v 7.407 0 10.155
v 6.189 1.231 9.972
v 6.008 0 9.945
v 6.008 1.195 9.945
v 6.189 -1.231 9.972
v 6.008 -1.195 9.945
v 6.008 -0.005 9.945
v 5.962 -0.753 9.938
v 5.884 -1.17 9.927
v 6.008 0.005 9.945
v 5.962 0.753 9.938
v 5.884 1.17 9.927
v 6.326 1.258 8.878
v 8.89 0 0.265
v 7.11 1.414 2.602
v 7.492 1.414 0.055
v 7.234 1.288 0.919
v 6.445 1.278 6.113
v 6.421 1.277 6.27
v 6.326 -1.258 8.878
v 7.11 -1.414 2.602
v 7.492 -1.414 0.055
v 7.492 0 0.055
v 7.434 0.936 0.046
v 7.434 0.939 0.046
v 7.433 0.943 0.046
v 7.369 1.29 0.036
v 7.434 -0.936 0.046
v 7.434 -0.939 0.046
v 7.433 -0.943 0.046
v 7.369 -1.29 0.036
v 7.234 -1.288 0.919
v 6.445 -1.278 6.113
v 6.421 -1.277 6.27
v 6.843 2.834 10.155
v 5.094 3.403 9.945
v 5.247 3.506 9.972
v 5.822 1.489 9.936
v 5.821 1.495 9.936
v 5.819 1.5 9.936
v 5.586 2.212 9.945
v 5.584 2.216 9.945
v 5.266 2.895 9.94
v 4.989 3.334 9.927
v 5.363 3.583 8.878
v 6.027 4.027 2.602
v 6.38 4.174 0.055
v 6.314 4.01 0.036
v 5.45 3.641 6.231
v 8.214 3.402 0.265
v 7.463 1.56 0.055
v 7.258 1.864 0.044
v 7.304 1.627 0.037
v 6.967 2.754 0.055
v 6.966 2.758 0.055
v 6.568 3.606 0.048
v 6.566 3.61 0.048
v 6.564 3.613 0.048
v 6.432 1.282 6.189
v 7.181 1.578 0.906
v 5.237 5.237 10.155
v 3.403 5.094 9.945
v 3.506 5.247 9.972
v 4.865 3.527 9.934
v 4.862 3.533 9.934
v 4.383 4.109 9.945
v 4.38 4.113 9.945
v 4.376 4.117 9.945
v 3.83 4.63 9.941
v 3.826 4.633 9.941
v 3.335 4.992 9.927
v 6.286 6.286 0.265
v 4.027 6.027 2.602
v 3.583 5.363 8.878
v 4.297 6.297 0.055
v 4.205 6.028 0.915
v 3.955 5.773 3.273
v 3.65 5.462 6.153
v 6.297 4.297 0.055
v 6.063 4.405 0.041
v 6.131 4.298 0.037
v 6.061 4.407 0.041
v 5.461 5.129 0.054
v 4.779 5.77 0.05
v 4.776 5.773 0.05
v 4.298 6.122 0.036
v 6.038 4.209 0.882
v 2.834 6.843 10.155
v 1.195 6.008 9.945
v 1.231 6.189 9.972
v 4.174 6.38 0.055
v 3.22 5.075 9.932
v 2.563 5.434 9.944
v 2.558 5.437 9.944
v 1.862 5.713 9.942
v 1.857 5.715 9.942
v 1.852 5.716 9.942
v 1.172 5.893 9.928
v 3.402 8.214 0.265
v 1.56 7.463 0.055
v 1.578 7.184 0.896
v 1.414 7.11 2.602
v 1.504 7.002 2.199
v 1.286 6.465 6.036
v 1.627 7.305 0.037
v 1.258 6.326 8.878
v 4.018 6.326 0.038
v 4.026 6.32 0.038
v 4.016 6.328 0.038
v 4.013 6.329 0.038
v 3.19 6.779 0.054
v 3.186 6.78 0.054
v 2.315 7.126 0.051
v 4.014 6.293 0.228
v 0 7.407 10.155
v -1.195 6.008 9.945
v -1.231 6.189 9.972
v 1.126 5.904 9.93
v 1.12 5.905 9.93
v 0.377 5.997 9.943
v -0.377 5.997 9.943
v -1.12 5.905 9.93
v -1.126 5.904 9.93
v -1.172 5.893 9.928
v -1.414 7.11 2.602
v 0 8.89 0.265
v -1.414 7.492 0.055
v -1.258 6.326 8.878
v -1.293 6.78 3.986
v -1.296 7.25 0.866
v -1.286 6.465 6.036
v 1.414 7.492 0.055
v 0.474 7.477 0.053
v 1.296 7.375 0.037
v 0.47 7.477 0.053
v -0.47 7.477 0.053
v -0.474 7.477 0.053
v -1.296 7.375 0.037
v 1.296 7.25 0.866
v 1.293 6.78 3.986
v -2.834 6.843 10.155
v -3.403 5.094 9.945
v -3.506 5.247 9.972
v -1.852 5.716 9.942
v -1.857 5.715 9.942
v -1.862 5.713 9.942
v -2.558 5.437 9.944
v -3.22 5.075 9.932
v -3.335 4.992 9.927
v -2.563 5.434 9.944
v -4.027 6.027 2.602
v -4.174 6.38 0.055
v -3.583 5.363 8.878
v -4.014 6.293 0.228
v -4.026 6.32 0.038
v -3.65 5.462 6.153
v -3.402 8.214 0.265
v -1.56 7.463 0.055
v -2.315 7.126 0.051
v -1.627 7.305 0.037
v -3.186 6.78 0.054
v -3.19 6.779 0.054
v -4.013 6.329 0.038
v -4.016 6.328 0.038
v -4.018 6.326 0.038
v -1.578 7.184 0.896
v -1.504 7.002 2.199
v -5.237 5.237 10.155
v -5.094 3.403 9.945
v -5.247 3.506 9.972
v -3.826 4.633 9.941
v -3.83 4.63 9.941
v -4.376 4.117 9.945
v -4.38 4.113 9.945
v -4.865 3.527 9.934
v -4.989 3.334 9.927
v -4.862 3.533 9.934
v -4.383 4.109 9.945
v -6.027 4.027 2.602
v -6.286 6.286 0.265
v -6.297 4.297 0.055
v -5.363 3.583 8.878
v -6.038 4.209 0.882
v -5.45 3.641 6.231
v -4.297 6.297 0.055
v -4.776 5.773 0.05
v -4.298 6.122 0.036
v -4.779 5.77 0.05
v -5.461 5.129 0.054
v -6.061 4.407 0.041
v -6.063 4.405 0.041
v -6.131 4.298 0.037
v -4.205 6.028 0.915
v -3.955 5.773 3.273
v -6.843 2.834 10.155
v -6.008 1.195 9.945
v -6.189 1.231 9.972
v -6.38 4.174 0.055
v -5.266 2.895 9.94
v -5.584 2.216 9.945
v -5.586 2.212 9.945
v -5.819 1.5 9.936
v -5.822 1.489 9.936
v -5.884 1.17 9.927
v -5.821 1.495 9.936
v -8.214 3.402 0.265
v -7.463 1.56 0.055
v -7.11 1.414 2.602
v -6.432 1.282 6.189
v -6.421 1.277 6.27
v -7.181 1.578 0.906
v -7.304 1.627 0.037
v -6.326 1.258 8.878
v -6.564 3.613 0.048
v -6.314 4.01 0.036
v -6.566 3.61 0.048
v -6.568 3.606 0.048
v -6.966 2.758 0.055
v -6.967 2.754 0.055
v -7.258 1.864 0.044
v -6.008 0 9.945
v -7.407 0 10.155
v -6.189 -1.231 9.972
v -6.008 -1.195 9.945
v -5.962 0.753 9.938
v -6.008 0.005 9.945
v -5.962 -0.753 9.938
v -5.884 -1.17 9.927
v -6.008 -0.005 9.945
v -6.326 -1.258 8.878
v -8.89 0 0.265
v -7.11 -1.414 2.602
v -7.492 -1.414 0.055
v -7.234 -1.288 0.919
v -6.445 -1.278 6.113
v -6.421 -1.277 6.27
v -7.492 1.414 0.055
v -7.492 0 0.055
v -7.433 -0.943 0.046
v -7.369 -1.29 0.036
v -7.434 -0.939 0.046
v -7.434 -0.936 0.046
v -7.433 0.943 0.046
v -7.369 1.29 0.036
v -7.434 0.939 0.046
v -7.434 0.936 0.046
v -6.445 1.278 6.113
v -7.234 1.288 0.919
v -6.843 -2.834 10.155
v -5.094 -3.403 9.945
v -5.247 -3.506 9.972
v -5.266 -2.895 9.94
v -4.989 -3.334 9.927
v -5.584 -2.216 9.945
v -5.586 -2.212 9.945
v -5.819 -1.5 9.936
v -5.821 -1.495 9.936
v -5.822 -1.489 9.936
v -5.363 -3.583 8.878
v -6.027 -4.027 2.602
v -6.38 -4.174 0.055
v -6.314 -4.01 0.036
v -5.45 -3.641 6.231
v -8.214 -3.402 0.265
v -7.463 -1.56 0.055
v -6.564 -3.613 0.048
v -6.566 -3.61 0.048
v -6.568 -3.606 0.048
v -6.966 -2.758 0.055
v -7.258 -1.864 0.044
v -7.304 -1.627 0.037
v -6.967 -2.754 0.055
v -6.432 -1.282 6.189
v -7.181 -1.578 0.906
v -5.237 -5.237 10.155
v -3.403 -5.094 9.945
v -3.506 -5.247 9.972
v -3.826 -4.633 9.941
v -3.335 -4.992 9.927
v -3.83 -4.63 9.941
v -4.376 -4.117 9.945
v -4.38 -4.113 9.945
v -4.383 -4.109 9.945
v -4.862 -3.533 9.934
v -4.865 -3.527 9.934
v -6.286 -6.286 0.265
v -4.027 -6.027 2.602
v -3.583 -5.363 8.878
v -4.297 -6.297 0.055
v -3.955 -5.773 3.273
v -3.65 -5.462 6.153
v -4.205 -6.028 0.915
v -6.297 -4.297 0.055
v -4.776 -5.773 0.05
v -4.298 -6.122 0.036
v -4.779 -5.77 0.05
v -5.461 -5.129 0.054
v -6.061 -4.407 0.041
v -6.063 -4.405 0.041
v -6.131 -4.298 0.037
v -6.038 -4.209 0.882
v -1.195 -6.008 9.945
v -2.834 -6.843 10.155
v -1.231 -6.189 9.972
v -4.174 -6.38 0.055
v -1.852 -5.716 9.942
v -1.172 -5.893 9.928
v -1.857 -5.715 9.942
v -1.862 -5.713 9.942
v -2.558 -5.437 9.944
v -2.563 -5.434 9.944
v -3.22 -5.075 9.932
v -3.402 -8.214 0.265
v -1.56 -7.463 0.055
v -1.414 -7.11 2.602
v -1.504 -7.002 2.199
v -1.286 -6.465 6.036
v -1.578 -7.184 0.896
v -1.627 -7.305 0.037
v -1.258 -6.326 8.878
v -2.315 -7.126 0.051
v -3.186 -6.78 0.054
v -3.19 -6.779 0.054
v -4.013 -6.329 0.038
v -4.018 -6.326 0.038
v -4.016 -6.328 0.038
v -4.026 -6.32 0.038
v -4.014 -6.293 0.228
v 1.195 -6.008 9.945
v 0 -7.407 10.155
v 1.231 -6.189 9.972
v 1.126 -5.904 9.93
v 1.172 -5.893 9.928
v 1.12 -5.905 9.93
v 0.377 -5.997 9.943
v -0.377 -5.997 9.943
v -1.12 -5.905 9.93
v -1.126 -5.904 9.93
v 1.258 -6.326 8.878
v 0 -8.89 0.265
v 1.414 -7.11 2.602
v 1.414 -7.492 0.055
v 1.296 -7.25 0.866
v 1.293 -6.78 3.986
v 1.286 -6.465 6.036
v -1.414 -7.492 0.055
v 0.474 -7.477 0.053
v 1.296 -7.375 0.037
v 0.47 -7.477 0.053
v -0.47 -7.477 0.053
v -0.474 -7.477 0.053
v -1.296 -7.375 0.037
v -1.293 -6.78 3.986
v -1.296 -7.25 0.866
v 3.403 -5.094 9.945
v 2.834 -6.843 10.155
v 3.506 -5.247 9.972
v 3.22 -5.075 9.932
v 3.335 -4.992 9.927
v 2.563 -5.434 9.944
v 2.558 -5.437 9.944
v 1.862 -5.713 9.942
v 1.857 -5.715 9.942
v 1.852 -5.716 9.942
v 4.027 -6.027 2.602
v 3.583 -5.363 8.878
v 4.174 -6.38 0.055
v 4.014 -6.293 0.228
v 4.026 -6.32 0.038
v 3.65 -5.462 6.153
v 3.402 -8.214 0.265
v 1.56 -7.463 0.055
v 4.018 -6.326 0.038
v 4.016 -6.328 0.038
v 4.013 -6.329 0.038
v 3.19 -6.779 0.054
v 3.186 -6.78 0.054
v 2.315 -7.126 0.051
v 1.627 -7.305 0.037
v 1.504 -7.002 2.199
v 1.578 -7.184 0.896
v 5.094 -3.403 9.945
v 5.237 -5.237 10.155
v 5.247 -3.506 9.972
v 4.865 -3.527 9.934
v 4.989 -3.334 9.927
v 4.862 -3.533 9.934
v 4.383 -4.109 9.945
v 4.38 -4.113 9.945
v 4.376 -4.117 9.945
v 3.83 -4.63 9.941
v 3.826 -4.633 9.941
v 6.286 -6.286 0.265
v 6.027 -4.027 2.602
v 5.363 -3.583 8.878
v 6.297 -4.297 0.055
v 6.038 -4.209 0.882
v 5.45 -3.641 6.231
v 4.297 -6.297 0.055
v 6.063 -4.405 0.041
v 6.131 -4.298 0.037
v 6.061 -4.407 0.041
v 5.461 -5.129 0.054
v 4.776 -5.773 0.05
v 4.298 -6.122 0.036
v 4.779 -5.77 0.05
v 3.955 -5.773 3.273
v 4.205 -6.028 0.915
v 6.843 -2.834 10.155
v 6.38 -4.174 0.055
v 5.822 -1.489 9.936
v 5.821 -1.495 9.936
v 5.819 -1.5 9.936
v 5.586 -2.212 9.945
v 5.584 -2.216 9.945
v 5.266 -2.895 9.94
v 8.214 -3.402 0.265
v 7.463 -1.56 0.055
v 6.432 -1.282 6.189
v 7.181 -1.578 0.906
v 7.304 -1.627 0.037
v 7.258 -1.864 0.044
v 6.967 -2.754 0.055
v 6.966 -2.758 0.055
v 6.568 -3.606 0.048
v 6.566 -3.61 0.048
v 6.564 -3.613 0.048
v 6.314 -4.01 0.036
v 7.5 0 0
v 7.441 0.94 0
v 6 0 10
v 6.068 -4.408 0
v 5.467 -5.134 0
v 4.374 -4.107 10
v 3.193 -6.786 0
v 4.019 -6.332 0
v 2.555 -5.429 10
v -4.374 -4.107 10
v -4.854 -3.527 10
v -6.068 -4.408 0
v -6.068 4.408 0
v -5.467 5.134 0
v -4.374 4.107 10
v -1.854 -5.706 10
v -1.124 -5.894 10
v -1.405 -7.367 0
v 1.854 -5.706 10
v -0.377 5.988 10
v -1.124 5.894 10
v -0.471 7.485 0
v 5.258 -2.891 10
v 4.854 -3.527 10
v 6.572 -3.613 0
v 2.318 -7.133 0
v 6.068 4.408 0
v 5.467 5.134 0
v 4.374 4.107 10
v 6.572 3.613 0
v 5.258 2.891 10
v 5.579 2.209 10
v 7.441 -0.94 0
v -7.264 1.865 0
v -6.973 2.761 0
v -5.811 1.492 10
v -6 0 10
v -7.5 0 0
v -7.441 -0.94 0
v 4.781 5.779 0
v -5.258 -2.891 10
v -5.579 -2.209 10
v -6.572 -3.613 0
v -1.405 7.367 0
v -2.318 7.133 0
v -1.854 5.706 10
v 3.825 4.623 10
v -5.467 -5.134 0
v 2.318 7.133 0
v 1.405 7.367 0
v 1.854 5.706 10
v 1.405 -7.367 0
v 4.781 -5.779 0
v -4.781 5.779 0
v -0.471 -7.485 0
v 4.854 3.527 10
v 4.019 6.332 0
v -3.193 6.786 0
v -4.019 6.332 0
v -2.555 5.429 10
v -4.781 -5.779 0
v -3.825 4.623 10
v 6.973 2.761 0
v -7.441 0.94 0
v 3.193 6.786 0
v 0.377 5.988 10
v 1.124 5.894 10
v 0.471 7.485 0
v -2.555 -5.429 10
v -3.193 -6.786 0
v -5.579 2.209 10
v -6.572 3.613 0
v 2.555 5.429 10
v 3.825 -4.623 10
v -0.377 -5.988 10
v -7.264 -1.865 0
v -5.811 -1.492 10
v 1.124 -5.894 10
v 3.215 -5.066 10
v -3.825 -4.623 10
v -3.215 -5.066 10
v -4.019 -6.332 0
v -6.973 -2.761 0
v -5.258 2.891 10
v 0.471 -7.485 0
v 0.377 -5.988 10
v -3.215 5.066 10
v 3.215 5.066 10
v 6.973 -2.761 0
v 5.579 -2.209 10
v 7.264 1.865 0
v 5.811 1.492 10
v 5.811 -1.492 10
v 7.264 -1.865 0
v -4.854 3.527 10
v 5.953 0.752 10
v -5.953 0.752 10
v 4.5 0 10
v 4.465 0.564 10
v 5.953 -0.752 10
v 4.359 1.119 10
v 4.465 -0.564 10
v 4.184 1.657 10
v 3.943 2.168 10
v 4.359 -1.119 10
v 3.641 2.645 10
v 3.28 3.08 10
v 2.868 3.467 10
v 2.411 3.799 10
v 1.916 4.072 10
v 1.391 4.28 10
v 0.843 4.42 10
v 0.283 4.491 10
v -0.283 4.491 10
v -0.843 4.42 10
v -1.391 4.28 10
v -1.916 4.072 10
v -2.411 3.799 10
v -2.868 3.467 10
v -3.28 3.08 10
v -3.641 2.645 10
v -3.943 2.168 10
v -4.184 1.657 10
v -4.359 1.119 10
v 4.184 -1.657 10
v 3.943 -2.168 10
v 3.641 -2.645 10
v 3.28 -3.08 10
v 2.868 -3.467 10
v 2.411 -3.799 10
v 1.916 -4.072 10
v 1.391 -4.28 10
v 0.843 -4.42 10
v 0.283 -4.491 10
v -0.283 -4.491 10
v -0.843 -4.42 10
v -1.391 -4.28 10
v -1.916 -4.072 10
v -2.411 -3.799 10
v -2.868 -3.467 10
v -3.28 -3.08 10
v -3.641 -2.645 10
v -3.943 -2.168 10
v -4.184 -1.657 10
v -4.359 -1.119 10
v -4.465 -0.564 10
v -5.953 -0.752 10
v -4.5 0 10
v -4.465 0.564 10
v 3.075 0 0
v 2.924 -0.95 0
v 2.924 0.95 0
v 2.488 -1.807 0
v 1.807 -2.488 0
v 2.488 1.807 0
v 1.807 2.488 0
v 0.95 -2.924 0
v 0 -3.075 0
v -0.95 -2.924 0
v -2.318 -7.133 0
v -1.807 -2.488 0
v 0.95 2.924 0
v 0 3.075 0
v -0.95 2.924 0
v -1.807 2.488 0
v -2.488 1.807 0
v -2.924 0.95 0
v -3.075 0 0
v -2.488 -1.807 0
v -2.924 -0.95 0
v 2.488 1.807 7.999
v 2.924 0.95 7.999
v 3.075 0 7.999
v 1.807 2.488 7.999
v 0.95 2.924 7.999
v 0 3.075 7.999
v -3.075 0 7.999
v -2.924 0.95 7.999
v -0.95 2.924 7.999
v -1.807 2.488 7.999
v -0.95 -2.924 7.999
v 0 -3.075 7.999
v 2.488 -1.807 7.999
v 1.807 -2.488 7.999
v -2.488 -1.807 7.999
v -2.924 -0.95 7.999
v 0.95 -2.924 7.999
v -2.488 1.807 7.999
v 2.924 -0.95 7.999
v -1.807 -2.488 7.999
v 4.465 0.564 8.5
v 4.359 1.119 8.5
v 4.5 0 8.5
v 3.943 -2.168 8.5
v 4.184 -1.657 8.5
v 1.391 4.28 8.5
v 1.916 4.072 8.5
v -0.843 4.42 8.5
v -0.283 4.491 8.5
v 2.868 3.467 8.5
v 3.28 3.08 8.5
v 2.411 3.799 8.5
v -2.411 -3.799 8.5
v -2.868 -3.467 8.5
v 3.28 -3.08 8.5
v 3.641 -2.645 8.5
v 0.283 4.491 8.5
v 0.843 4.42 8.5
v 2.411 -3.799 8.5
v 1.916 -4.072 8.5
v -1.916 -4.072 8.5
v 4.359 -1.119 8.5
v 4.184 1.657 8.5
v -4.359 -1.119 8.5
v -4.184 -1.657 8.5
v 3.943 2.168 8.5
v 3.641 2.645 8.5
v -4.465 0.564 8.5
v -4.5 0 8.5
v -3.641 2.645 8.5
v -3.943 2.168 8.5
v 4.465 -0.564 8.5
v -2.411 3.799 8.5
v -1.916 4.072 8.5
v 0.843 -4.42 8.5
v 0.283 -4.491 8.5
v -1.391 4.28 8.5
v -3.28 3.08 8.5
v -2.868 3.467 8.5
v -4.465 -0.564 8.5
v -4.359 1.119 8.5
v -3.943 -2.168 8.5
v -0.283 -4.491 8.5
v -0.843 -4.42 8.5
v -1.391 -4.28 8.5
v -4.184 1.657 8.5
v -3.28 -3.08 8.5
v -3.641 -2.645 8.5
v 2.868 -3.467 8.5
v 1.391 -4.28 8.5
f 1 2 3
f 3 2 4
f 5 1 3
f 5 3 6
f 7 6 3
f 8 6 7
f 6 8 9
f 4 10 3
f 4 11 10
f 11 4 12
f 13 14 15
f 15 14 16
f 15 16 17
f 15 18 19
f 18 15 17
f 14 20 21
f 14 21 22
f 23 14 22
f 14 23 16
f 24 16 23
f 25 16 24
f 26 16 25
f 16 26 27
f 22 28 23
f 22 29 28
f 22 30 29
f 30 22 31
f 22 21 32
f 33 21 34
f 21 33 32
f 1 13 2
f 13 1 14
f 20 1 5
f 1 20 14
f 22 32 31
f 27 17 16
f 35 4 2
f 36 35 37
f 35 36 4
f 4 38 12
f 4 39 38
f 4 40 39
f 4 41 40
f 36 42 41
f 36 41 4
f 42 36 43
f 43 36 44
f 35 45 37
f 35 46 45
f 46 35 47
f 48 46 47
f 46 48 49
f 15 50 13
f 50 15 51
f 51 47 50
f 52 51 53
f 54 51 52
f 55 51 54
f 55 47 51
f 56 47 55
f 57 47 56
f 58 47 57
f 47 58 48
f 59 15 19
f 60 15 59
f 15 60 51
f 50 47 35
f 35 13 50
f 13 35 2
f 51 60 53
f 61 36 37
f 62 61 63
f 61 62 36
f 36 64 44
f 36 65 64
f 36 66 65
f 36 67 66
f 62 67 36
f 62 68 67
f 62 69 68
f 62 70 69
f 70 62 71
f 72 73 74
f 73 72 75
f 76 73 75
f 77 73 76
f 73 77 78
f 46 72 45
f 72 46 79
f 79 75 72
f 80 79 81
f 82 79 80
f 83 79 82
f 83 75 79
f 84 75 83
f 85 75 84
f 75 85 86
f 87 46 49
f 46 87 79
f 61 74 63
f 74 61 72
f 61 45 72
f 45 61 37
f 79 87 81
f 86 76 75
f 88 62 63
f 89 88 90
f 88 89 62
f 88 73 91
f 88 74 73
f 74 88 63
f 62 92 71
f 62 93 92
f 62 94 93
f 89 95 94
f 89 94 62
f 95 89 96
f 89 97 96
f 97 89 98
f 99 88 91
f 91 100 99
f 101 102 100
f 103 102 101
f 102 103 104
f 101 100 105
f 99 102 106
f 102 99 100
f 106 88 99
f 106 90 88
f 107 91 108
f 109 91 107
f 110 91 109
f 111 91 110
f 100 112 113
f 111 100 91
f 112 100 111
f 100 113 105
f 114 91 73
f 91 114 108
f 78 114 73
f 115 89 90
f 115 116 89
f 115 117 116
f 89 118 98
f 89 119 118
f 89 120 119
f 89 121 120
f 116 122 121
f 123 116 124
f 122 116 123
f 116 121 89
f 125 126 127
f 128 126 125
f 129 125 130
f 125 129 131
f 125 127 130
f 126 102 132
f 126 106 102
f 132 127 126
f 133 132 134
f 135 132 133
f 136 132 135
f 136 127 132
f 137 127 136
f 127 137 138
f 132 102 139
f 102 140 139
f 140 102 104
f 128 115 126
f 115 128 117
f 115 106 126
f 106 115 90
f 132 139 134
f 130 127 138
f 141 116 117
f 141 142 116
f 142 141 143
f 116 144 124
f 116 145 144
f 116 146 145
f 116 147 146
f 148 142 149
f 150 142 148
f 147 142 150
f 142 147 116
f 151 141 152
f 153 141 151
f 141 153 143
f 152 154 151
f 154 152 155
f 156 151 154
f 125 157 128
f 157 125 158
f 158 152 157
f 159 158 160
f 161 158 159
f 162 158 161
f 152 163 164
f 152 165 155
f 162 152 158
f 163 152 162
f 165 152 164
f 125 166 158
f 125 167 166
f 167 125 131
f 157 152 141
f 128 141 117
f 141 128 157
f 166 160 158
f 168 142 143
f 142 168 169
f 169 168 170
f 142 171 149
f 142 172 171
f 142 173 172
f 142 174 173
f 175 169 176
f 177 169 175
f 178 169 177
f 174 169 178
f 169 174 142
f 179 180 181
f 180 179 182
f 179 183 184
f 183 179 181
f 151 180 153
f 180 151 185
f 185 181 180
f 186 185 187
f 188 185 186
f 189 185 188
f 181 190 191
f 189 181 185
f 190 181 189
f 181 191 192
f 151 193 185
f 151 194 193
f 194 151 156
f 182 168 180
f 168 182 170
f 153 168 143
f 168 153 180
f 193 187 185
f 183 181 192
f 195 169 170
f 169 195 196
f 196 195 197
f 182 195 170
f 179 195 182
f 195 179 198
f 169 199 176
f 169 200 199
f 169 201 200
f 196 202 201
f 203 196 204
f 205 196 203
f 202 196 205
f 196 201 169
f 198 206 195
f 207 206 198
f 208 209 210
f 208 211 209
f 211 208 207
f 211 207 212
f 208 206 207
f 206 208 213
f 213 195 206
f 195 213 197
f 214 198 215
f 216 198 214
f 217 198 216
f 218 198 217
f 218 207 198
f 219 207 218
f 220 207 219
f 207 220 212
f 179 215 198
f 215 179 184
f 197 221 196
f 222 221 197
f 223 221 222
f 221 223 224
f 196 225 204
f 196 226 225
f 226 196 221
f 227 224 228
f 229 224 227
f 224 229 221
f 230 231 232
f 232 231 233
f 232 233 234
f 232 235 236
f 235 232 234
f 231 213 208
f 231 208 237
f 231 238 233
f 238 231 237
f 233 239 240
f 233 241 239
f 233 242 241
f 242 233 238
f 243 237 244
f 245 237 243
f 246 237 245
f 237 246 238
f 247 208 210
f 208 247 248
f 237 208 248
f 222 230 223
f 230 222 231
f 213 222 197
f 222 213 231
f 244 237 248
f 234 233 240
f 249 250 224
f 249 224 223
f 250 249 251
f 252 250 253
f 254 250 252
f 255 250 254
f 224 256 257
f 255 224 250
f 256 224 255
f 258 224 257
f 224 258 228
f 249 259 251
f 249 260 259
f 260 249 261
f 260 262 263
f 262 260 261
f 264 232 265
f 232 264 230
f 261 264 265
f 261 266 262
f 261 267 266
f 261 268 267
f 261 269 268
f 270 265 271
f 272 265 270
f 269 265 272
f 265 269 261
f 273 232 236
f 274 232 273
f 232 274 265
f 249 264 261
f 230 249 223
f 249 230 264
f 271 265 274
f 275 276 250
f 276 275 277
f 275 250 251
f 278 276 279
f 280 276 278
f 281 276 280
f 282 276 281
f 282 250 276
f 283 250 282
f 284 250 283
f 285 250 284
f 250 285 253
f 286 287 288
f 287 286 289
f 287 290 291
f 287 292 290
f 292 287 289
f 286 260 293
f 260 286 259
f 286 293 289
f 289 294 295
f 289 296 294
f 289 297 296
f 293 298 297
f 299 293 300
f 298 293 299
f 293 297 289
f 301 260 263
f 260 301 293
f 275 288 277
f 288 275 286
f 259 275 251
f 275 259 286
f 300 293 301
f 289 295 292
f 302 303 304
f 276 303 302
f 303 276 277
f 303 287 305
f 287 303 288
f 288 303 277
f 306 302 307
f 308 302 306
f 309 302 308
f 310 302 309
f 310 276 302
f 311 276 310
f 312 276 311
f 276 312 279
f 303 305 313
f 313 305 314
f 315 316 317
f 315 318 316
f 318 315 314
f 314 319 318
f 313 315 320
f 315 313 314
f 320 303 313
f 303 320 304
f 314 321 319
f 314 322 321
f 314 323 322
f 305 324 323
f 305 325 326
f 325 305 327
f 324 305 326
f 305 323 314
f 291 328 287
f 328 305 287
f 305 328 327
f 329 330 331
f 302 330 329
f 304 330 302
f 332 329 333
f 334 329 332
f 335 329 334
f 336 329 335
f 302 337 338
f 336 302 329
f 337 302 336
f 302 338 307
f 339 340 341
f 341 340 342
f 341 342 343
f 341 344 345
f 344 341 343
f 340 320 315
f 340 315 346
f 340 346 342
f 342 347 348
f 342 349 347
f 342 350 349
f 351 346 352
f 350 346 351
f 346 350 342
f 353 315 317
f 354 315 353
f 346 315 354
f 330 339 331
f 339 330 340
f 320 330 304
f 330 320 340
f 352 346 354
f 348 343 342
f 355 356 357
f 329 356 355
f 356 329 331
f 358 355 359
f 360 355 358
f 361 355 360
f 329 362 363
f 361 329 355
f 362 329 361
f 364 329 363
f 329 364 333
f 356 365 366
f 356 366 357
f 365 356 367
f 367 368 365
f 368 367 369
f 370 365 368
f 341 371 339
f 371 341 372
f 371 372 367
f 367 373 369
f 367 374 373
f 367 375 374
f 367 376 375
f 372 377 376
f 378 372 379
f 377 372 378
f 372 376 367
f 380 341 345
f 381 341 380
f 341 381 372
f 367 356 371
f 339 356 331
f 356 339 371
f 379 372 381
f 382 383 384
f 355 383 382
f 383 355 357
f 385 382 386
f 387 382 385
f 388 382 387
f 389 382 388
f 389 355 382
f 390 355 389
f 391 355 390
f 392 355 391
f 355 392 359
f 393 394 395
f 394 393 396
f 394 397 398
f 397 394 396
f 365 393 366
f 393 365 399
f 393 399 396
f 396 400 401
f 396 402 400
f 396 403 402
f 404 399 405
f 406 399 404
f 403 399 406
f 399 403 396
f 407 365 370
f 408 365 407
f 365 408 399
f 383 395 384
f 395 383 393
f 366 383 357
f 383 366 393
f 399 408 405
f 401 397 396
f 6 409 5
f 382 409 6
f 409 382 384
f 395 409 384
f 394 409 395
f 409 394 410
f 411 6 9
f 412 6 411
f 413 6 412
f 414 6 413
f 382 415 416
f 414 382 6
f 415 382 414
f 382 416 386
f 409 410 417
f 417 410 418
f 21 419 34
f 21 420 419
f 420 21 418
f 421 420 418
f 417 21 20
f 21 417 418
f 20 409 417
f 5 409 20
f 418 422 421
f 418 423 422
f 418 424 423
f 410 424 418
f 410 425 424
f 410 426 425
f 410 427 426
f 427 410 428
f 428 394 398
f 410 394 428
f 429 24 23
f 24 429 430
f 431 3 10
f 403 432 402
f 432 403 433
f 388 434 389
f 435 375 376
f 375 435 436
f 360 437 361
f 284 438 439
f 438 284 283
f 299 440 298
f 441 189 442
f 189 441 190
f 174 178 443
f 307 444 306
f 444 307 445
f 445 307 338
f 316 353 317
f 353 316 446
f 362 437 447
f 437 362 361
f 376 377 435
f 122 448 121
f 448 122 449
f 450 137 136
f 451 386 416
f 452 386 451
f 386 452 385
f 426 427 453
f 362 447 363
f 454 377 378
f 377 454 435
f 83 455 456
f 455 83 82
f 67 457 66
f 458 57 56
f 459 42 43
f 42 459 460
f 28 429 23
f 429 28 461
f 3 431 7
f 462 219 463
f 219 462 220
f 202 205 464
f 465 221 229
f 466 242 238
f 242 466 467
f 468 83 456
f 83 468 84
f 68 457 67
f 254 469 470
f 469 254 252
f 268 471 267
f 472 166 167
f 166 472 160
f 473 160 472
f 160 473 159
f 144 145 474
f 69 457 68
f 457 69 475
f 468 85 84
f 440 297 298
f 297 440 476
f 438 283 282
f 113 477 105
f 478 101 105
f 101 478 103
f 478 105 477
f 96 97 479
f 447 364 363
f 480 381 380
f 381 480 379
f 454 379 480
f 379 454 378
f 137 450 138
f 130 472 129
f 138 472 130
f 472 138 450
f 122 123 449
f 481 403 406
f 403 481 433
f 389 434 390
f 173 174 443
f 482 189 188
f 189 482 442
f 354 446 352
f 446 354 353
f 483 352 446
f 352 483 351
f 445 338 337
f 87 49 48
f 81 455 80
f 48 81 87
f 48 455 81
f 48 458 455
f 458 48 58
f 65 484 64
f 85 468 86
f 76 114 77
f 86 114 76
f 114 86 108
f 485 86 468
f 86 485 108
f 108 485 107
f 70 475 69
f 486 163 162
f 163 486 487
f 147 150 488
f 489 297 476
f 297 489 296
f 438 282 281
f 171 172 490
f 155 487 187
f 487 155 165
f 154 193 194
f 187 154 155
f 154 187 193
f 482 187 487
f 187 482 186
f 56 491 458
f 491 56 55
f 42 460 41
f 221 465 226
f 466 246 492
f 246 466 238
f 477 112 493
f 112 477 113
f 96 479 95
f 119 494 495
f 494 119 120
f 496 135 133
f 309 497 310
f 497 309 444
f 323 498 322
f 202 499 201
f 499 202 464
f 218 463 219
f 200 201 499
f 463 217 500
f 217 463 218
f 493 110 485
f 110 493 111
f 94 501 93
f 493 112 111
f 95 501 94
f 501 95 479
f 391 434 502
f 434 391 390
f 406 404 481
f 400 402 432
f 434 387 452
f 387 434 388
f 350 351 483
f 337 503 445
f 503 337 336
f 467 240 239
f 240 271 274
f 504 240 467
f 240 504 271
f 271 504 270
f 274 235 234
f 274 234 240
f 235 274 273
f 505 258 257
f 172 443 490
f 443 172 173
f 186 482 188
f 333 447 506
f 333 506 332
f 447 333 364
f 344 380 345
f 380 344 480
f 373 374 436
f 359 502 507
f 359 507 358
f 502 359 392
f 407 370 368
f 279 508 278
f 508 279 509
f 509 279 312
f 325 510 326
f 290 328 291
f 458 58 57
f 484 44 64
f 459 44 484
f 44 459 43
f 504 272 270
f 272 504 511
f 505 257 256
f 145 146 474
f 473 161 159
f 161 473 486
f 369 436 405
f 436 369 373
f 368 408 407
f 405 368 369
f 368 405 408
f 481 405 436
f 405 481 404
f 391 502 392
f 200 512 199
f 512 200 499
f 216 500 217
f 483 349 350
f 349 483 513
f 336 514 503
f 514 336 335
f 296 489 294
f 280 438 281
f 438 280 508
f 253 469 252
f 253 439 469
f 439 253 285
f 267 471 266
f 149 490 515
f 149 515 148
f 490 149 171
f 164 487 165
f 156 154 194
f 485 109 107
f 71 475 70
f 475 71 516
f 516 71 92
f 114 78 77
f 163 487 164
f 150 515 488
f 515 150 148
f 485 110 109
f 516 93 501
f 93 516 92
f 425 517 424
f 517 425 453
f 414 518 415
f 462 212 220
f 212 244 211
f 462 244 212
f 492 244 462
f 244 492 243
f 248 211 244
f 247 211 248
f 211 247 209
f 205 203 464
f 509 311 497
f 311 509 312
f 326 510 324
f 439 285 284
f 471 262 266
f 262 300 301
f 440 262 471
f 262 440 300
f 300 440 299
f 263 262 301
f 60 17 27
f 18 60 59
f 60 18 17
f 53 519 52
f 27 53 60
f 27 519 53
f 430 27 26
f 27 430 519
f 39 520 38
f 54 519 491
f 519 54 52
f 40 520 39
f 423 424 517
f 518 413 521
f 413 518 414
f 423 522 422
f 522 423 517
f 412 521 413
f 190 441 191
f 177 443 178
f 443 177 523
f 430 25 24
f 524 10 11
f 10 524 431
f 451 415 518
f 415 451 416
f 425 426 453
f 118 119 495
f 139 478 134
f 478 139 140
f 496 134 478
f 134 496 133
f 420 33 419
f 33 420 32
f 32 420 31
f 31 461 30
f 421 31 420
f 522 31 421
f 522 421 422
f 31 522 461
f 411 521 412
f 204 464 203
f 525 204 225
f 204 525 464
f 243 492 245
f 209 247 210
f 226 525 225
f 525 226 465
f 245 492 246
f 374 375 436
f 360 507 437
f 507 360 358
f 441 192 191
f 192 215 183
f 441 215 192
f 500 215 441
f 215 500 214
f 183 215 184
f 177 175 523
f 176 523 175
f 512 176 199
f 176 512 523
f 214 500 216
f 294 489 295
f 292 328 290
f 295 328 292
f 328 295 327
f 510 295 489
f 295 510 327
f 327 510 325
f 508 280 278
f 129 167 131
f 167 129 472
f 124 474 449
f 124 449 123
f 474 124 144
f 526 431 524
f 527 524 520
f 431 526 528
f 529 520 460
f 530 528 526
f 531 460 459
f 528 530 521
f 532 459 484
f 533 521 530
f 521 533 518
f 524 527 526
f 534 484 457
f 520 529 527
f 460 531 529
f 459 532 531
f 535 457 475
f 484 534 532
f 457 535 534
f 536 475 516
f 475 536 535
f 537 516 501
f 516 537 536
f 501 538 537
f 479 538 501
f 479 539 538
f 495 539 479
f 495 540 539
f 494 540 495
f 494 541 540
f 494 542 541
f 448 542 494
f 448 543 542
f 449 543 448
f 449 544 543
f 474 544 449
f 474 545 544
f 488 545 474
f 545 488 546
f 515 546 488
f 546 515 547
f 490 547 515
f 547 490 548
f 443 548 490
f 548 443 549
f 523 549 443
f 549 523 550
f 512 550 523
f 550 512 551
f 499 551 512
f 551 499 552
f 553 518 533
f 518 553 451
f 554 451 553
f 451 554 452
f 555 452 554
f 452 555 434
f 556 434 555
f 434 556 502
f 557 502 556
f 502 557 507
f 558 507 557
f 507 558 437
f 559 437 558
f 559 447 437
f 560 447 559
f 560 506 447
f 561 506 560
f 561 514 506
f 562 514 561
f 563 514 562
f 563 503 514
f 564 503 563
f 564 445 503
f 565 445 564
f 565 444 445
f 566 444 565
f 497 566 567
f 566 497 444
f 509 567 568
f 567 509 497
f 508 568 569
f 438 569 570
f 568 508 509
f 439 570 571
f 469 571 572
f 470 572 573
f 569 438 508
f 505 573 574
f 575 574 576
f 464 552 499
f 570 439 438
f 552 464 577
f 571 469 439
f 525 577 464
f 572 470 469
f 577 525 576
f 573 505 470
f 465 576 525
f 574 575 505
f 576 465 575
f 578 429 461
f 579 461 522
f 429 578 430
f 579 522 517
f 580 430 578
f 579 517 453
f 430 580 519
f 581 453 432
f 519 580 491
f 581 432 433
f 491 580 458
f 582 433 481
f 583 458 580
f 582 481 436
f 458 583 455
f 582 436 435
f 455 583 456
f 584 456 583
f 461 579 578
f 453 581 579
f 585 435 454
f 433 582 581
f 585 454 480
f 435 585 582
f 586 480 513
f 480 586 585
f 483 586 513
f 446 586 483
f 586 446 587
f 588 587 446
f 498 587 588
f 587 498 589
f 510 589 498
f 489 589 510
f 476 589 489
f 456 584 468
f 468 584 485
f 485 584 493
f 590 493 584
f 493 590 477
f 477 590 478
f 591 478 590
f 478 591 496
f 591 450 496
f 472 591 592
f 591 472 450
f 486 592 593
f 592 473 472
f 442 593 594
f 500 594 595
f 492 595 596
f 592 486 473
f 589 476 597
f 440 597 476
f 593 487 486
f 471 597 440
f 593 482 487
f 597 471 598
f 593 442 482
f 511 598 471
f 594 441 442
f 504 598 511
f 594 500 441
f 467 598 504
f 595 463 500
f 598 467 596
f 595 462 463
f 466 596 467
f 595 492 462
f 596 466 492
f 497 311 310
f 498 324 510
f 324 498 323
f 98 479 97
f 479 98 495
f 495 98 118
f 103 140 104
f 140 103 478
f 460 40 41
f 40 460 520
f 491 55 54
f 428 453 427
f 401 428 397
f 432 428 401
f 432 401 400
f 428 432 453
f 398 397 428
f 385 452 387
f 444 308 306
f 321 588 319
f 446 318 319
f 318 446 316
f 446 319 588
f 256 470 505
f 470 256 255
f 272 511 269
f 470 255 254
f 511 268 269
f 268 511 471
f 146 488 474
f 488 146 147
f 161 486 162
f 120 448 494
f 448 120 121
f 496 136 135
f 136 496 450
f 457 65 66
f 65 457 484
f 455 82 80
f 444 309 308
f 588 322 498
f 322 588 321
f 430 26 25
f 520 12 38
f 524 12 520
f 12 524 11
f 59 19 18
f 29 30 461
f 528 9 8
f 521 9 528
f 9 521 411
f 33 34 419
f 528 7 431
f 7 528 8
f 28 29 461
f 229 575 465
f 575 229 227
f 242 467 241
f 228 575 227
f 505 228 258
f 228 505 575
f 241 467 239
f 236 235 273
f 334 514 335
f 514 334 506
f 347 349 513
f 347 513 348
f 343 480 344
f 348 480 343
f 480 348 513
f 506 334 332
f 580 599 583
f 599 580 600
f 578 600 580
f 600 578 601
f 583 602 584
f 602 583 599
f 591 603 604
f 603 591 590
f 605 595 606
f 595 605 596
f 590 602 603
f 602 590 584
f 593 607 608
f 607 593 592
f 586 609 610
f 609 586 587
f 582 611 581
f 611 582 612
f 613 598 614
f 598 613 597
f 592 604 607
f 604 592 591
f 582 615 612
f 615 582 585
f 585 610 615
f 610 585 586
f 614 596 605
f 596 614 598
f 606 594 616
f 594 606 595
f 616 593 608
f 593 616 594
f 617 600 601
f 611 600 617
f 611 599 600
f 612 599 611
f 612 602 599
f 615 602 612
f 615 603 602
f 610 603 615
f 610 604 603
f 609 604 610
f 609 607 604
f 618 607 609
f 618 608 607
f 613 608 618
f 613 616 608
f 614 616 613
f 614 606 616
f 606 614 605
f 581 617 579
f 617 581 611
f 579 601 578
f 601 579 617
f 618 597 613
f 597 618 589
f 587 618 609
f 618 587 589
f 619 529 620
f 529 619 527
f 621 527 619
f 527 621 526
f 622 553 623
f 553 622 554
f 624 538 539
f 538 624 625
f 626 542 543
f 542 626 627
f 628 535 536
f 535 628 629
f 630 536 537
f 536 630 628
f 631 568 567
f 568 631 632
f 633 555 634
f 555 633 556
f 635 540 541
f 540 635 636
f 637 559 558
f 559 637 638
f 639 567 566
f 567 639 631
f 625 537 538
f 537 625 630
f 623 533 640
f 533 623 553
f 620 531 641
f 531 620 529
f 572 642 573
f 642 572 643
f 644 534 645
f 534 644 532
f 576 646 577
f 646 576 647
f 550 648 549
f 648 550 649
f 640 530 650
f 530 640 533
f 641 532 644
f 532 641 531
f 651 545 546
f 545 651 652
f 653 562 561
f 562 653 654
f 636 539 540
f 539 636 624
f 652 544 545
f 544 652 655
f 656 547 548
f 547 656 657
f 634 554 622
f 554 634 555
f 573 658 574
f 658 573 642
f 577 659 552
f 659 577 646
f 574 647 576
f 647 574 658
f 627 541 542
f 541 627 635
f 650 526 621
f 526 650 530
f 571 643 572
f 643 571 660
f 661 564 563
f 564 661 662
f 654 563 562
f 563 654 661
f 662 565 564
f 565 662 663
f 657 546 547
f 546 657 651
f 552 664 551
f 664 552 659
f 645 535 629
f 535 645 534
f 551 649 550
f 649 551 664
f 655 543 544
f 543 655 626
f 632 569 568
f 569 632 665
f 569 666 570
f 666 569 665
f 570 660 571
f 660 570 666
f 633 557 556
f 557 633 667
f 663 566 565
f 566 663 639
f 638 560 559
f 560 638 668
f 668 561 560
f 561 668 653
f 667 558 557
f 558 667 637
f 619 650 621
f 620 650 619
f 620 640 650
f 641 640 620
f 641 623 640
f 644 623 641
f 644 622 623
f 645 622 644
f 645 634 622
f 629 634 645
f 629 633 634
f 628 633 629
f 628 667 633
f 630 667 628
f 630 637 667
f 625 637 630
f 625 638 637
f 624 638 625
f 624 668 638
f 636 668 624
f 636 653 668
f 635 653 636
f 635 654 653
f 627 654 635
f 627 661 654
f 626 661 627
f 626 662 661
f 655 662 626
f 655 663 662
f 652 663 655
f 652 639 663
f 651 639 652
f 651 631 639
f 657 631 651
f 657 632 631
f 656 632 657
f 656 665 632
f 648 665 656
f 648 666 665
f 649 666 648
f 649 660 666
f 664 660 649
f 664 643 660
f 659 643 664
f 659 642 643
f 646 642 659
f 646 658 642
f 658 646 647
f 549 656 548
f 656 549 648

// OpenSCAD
/*

Trying to get the OpenSCAD CLI to make a bunch of versions of this with different parameters; this command is working:

/Applications/OpenSCAD.app/Contents/MacOS/OpenSCAD -D KnobHeight=20 -D TaperPercentage=30 -D CapType=2 -o knob.stl CustomizableKnob.scad

The -D flags are used to change the values of variables in the design.




I used ChatGPT to generate the script to use for loops to run through a list of possible values. My prompt to ChatGPT:

"I have a terminal command that works, "/Applications/OpenSCAD.app/Contents/MacOS/OpenSCAD -D KnobHeight=20 -D TaperPercentage=30 -D CapType=2 -o knob.stl CustomizableKnob.scad". I now want to write a loop that will change some of the variables I'm feeding that function so that I, for instance, get knobs with heights of 16, 18, 20, 22, 24, and 26, and taper percentages of 0, 5, 10, 15, 20, 25, 30, 35, 40, and 50. The files that are created should have sequential values, e.g. knob1.stl, knob2.stl, etc."


I had a few back-and-forths to fiddle with it but here is the final script I am running, called generateKnobs.sh:

//script start

    #!/bin/bash
    
    # Set path to OpenSCAD binary and source file
    OPENSCAD="/Applications/OpenSCAD.app/Contents/MacOS/OpenSCAD"
    SCADFILE="CustomizableKnob.scad"
    
    # Loop over KnobHeight values
    for height in 15 20 25 30; do
      # Loop over TaperPercentage values
      for taper in 0 10 20 30 40 50; do
        for captype in 1 2; do
          
          # Construct output filename with parameter values
          outfile="knob_h${height}_t${taper}_c${captype}.stl"
    
          # Run OpenSCAD command
          "$OPENSCAD" -D KnobHeight=$height -D TaperPercentage=$taper -D CapType=$captype -o "$outfile" "$SCADFILE"
    
          echo "Generated $outfile"
        done
      done
    done

//script end

- Robert Zacharias, rzachari@andrew.cmu.edu 8/1/25
released under a CC-BY license, following original author's move (see below)


The actual source for the knob generator below is "Customizable Knob!" from charliearmorycom, dated Feb. 25, 2013, available as thing #54024 at Thingiverse: <https://www.thingiverse.com/thing:54024>. The original author released it under a CC-BY license.

*/

//////////////////////////
// Customizable settings
//////////////////////////


// Diameter of the hole on the bottom (in mm).
HoleDiameter = 6.15;

// Depth of the hole in the bottom (in mm).  If you want the hole to go all the way through then set this to a number larger than the total height of the object.
HoleDepth = 8;

// If you want a D-shaped hole, set this to the thickness of the flat side (in mm).  Larger values for the flat make the hole smaller.
HoleFlatThickness = 0;

// Height (in mm).  If dome cap is selected, it is not included in height.  The shaft length is also not counted.
KnobHeight = 10;

// Diameter of base of round part of knob (in mm).  (Knurled ridges are not included in this measurement.)
KnobDiameter = 15;

// Shape of top of knob.  "Recessed" type can be painted.
CapType = 1;	// [0:Flat, 1:Recessed, 2:Dome]

// Do you want a large timer-knob style pointer?
TimerKnob=0;	// [0:No, 1:Yes]

// Would you like a divot on the top to indicate direction?
Pointer1 = 0;	// [0:No, 1:Yes]

// Would you like a line (pointer) on the front to indicate direction?
Pointer2 = 0;	// [0:No, 1:Yes]

// Do you want finger ridges around the knob?
Knurled = 1;	// [0:No, 1:Yes]

// 0 = A cylindrical knob, any other value will taper the knob.
TaperPercentage = 20;		// [0:0%, 10:10%, 20:20%, 30:30%, 40:40%, 50:50%]

// Width of "dial" ring (in mm).  Set to zero if you don't want the ring.
RingWidth = 0;

// The number of markings on the dial.  Set to zero if you don't want markings.  (RingWidth must be non-zero.)
RingMarkings = 10;

// diameter of the hole for the setscrew (in mm).  If you don't need a hole, set this to zero.
ScrewHoleDiameter = 0;

// Length of the shaft on the bottom of the knob (in mm).  If you don't want a shaft, set this value to zero.
ShaftLength = 0;

// Diameter of the shaft on the bottom of the knob (in mm).  (ShaftLength must be non-zero.)
ShaftDiameter = 10;

// Would you like a notch in the shaft?  It can be used for a press-on type knob (rather than using a setscrew).  (ShaftLength must be non-zero.)
NotchedShaft = 0;	// [0:No, 1:Yes]



//////////////////////////
//Advanced settings
//////////////////////////

RingThickness = 5*1;
DivotDepth = 1.5*1;
MarkingWidth = 1.5*1;
DistanceBetweenKnurls = 3*1;
TimerKnobConst = 1.8*1;



//////////////////////////
//Calculations
//////////////////////////

PI=3.14159265*1;
KnobMajorRadius = KnobDiameter/2;
KnobMinorRadius = KnobDiameter/2 * (1 - TaperPercentage/100);
KnobRadius = KnobMinorRadius + (KnobMajorRadius-KnobMinorRadius)/2;
KnobCircumference = PI*KnobDiameter;
Knurls = round(KnobCircumference/DistanceBetweenKnurls);
Divot=CapType;

TaperAngle=asin(KnobHeight / (sqrt(pow(KnobHeight, 2) +
		pow(KnobMajorRadius-KnobMinorRadius,2)))) - 90;

DivotRadius = KnobMinorRadius*.4;


union()
{
translate([0, 0, (ShaftLength==0)? 0 : ShaftLength-0.001])
difference()
{
union()
{
	// Primary knob cylinder
	cylinder(h=KnobHeight, r1=KnobMajorRadius, r2=KnobMinorRadius,
			$fn=50);
	
	if (Knurled)
		for (i=[0 : Knurls-1])
			rotate([0, 0, i * (360/Knurls)])
				translate([KnobRadius, 0, KnobHeight/2])
					rotate([0, TaperAngle, 0]) rotate([0, 0, 45])
						cube([2, 2, KnobHeight+.001], center=true);

 	if (RingMarkings>0)
		for (i=[0 : RingMarkings-1])
			rotate([0, 0, i * (360/RingMarkings)])
				translate([KnobMajorRadius + RingWidth/2, 0, 1])
					cube([RingWidth*.5, MarkingWidth, 2], center=true);		
	
	if (Pointer2==1)
		translate([KnobRadius, 0, KnobHeight/2-2])
			rotate([0, TaperAngle, 0])
				cube([8, 3, KnobHeight], center=true);		

	if (RingWidth>0)
		translate([0, 0, RingThickness/2])
			cylinder(r1=KnobMajorRadius + RingWidth, r2=KnobMinorRadius,
					h=RingThickness, $fn=50, center=true);

	if (Divot==2)
		translate([0, 0, KnobHeight])
			difference()
			{
				scale([1, 1, 0.5])
					sphere(r=KnobMinorRadius, $fn=50, center=true);

				translate([0, 0, 0-(KnobMinorRadius+.001)])
					cube([KnobMinorRadius*2.5, KnobMinorRadius*2.5,
							KnobMinorRadius*2], center=true);
			}

	if (TimerKnob==1) intersection()
		{
			translate([0, 0, 0-(KnobDiameter*TimerKnobConst) + KnobHeight])
			sphere(r=KnobDiameter*TimerKnobConst, $fn=50, center=true);		
	
			translate([0-(KnobDiameter*TimerKnobConst)*0.1, 0,
					KnobHeight/2])
				scale([1, 0.5, 1])
					cylinder(h=KnobHeight, r=(KnobDiameter*TimerKnobConst) *
							0.8, $fn=3, center=true);
		}
}

// Pointer1: Offset hemispherical divot
if (Pointer1==1)
	translate([KnobMinorRadius*.55, 0, KnobHeight + DivotRadius*.6])
		sphere(r=DivotRadius, $fn=40);

// Divot1: Centered cylynrical divot
if (Divot==1)
	translate([0, 0, KnobHeight])
		cylinder(h=DivotDepth*2, r=KnobMinorRadius-1.5, $fn=50,
				center=true);

if (ShaftLength==0)
{
	// Hole for shaft
	translate([0, 0, HoleDepth/2 - 0.001])
		difference()
		{
			cylinder(r=HoleDiameter/2, h=HoleDepth, $fn=20,
					center=true);
	
			// Flat for D-shaped hole
			translate([(0-HoleDiameter)+HoleFlatThickness, 0, 0])
				cube([HoleDiameter, HoleDiameter, HoleDepth+.001],
						center=true);
		}
	
	// Hole for setscrew
	if (ScrewHoleDiameter>0)
		translate([0 - (KnobMajorRadius+RingWidth+1)/2, 0,
				HoleDepth/2])
			rotate([0, 90, 0])
			cylinder(h=(KnobMajorRadius+RingWidth+1),
					r=ScrewHoleDiameter/2, $fn=20, center=true);
}

// Make sure bottom ends at z=0
translate([0, 0, -10])
	cube([(KnobMajorRadius+RingWidth) * 3,
			(KnobMajorRadius+RingWidth) * 3, 20], center=true);
}

if (ShaftLength>0)
	difference()
	{
		translate([0, 0, ShaftLength/2])
			cylinder(h=ShaftLength, r=ShaftDiameter/2, $fn=20,
					center=true);

		if (NotchedShaft==1)
		{
			cube([HoleDiameter/2, ShaftDiameter*2, ShaftLength],
					center=true);
		}

		// Hole for shaft
		translate([0, 0, HoleDepth/2 - 0.001])
			difference()
			{
				cylinder(r=HoleDiameter/2, h=HoleDepth, $fn=20,
						center=true);
		
				// Flat for D-shaped hole
				translate([(0-HoleDiameter)+HoleFlatThickness, 0, 0])
					cube([HoleDiameter, HoleDiameter, HoleDepth+.001],
							center=true);
			}
		
		// Hole for setscrew
		if (ScrewHoleDiameter>0)
			translate([0 - (KnobMajorRadius+RingWidth+1)/2, 0,
					HoleDepth/2])
				rotate([0, 90, 0])
				cylinder(h=(KnobMajorRadius+RingWidth+1),
						r=ScrewHoleDiameter/2, $fn=20, center=true);
	}
}
